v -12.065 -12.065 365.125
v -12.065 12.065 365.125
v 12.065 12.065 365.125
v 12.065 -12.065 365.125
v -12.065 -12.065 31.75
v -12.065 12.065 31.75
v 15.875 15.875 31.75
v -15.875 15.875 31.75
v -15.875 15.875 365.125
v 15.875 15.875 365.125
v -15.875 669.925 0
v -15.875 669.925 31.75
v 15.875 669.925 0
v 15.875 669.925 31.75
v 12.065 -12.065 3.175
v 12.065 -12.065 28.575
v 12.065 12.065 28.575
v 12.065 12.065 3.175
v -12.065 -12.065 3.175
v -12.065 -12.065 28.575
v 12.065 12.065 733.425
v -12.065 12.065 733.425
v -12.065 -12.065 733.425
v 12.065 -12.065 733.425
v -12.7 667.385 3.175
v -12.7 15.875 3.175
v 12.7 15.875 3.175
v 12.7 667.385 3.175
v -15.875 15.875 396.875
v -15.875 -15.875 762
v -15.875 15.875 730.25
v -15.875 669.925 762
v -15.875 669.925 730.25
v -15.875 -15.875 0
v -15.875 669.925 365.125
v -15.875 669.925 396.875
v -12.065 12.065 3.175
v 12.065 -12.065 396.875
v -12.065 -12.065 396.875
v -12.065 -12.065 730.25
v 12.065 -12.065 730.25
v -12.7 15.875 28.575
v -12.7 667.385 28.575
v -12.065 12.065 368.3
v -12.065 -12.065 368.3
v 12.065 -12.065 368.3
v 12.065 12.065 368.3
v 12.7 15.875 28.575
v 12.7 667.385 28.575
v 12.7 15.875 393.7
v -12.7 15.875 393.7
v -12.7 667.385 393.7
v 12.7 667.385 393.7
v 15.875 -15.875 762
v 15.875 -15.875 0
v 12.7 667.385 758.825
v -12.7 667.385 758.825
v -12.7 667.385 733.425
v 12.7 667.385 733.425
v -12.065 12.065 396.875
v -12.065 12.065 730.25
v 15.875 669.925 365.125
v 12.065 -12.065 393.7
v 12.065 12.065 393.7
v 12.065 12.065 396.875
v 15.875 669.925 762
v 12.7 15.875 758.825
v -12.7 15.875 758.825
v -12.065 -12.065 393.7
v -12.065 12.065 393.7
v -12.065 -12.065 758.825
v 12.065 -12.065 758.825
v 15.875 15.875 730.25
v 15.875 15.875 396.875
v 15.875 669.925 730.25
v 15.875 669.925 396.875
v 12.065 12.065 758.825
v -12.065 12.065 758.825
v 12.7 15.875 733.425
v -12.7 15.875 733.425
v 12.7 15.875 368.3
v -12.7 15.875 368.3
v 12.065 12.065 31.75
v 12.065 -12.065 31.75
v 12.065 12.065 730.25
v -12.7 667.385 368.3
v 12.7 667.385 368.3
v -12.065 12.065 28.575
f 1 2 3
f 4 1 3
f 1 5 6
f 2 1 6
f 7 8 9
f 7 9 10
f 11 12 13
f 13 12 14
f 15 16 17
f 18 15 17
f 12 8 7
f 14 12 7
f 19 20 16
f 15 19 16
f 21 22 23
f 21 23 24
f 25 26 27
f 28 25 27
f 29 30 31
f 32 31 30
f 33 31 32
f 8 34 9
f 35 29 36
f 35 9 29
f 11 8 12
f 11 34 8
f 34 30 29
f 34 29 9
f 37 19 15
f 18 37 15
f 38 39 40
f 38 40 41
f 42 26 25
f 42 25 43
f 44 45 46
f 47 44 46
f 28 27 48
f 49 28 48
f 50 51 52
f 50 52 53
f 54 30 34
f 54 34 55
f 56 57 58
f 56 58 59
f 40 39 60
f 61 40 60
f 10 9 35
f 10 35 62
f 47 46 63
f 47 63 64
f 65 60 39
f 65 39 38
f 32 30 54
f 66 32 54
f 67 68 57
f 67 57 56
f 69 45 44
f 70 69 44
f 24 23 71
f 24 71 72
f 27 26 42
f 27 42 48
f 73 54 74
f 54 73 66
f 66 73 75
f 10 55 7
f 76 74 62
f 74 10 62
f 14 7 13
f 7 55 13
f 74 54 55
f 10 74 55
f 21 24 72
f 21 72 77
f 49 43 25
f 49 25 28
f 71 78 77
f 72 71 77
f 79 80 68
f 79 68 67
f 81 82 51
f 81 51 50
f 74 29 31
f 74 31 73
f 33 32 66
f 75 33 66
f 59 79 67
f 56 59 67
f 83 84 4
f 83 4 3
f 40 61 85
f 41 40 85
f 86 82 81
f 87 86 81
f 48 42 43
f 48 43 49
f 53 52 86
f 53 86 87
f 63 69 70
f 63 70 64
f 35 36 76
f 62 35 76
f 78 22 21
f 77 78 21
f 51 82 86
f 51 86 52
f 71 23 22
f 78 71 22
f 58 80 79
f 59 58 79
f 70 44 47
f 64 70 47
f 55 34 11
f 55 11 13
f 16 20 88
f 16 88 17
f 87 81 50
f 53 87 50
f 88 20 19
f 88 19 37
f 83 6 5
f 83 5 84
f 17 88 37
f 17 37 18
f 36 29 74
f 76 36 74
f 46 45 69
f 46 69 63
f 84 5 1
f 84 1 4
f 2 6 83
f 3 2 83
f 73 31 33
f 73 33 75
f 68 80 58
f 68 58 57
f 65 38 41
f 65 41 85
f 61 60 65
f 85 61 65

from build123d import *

# Parameters (mm, degrees)
SKETCH1_W           = 31.75
SKETCH1_H           = 31.75
SKETCH1_W_2         = 24.13
SKETCH1_H_2         = 24.13
BOSS_EXTRUDE1_DEPTH = 762
SKETCH14_W          = 31.75
SKETCH14_H          = 31.75
SKETCH14_W_2        = 25.4
SKETCH14_H_2        = 25.4
BOSS_EXTRUDE2_DEPTH = 685.8
SKETCH14_2_W        = 25.4
SKETCH14_2_H        = 25.4
BOSS_EXTRUDE3_DEPTH = 2.54
BOSS_EXTRUDE6_START = -683.26
SKETCH14_3_W        = 25.4
SKETCH14_3_H        = 25.4
BOSS_EXTRUDE6_DEPTH = 2.54
SKETCH1_2_W         = 24.13
SKETCH1_2_H         = 24.13
BOSS_EXTRUDE4_DEPTH = 2.54
BOSS_EXTRUDE5_START = 759.46
SKETCH1_3_W         = 24.13
SKETCH1_3_H         = 24.13
BOSS_EXTRUDE5_DEPTH = 2.54
LPATTERN4_COUNT     = 3
LPATTERN4_PITCH     = 365.125


with BuildPart() as part:
    # Sketch1 → Boss-Extrude1 (new body)
    with BuildSketch(Plane.XY):
        Rectangle(SKETCH1_W, SKETCH1_H)
        Rectangle(SKETCH1_W_2, SKETCH1_H_2, mode=Mode.SUBTRACT)
    extrude(amount=BOSS_EXTRUDE1_DEPTH)

    # Sketch14 → Boss-Extrude2 (add)
    with BuildSketch(Plane.XZ.offset(15.875)):
        with Locations((0, 746.125)):
            Rectangle(SKETCH14_W, SKETCH14_H)
        with Locations((0, 746.125)):
            Rectangle(SKETCH14_W_2, SKETCH14_H_2, mode=Mode.SUBTRACT)
    boss_extrude2 = extrude(amount=-BOSS_EXTRUDE2_DEPTH)

    # Sketch14<2> → Boss-Extrude3 (add)
    with BuildSketch(Plane.XZ.offset(15.875)):
        with Locations((0, 746.125)):
            Rectangle(SKETCH14_2_W, SKETCH14_2_H)
    boss_extrude3 = extrude(amount=-BOSS_EXTRUDE3_DEPTH)

    # Sketch14<3> → Boss-Extrude6 (add)
    with BuildSketch(Plane.XZ.offset(15.875).offset(BOSS_EXTRUDE6_START)):
        with Locations((0, 746.125)):
            Rectangle(SKETCH14_3_W, SKETCH14_3_H)
    boss_extrude6 = extrude(amount=-BOSS_EXTRUDE6_DEPTH)

    # Sketch1<2> → Boss-Extrude4 (add)
    with BuildSketch(Plane.XY):
        Rectangle(SKETCH1_2_W, SKETCH1_2_H)
    extrude(amount=BOSS_EXTRUDE4_DEPTH)

    # Sketch1<3> → Boss-Extrude5 (add)
    with BuildSketch(Plane.XY.offset(BOSS_EXTRUDE5_START)):
        Rectangle(SKETCH1_3_W, SKETCH1_3_H)
    extrude(amount=BOSS_EXTRUDE5_DEPTH)

    # LPattern4: Boss-Extrude2, Boss-Extrude3, Boss-Extrude6 ×3
    with Locations(*[(0, 0, -i * LPATTERN4_PITCH) for i in range(1, LPATTERN4_COUNT)]):
        add(boss_extrude2)
        add(boss_extrude3)
        add(boss_extrude6)


solid = part.part
